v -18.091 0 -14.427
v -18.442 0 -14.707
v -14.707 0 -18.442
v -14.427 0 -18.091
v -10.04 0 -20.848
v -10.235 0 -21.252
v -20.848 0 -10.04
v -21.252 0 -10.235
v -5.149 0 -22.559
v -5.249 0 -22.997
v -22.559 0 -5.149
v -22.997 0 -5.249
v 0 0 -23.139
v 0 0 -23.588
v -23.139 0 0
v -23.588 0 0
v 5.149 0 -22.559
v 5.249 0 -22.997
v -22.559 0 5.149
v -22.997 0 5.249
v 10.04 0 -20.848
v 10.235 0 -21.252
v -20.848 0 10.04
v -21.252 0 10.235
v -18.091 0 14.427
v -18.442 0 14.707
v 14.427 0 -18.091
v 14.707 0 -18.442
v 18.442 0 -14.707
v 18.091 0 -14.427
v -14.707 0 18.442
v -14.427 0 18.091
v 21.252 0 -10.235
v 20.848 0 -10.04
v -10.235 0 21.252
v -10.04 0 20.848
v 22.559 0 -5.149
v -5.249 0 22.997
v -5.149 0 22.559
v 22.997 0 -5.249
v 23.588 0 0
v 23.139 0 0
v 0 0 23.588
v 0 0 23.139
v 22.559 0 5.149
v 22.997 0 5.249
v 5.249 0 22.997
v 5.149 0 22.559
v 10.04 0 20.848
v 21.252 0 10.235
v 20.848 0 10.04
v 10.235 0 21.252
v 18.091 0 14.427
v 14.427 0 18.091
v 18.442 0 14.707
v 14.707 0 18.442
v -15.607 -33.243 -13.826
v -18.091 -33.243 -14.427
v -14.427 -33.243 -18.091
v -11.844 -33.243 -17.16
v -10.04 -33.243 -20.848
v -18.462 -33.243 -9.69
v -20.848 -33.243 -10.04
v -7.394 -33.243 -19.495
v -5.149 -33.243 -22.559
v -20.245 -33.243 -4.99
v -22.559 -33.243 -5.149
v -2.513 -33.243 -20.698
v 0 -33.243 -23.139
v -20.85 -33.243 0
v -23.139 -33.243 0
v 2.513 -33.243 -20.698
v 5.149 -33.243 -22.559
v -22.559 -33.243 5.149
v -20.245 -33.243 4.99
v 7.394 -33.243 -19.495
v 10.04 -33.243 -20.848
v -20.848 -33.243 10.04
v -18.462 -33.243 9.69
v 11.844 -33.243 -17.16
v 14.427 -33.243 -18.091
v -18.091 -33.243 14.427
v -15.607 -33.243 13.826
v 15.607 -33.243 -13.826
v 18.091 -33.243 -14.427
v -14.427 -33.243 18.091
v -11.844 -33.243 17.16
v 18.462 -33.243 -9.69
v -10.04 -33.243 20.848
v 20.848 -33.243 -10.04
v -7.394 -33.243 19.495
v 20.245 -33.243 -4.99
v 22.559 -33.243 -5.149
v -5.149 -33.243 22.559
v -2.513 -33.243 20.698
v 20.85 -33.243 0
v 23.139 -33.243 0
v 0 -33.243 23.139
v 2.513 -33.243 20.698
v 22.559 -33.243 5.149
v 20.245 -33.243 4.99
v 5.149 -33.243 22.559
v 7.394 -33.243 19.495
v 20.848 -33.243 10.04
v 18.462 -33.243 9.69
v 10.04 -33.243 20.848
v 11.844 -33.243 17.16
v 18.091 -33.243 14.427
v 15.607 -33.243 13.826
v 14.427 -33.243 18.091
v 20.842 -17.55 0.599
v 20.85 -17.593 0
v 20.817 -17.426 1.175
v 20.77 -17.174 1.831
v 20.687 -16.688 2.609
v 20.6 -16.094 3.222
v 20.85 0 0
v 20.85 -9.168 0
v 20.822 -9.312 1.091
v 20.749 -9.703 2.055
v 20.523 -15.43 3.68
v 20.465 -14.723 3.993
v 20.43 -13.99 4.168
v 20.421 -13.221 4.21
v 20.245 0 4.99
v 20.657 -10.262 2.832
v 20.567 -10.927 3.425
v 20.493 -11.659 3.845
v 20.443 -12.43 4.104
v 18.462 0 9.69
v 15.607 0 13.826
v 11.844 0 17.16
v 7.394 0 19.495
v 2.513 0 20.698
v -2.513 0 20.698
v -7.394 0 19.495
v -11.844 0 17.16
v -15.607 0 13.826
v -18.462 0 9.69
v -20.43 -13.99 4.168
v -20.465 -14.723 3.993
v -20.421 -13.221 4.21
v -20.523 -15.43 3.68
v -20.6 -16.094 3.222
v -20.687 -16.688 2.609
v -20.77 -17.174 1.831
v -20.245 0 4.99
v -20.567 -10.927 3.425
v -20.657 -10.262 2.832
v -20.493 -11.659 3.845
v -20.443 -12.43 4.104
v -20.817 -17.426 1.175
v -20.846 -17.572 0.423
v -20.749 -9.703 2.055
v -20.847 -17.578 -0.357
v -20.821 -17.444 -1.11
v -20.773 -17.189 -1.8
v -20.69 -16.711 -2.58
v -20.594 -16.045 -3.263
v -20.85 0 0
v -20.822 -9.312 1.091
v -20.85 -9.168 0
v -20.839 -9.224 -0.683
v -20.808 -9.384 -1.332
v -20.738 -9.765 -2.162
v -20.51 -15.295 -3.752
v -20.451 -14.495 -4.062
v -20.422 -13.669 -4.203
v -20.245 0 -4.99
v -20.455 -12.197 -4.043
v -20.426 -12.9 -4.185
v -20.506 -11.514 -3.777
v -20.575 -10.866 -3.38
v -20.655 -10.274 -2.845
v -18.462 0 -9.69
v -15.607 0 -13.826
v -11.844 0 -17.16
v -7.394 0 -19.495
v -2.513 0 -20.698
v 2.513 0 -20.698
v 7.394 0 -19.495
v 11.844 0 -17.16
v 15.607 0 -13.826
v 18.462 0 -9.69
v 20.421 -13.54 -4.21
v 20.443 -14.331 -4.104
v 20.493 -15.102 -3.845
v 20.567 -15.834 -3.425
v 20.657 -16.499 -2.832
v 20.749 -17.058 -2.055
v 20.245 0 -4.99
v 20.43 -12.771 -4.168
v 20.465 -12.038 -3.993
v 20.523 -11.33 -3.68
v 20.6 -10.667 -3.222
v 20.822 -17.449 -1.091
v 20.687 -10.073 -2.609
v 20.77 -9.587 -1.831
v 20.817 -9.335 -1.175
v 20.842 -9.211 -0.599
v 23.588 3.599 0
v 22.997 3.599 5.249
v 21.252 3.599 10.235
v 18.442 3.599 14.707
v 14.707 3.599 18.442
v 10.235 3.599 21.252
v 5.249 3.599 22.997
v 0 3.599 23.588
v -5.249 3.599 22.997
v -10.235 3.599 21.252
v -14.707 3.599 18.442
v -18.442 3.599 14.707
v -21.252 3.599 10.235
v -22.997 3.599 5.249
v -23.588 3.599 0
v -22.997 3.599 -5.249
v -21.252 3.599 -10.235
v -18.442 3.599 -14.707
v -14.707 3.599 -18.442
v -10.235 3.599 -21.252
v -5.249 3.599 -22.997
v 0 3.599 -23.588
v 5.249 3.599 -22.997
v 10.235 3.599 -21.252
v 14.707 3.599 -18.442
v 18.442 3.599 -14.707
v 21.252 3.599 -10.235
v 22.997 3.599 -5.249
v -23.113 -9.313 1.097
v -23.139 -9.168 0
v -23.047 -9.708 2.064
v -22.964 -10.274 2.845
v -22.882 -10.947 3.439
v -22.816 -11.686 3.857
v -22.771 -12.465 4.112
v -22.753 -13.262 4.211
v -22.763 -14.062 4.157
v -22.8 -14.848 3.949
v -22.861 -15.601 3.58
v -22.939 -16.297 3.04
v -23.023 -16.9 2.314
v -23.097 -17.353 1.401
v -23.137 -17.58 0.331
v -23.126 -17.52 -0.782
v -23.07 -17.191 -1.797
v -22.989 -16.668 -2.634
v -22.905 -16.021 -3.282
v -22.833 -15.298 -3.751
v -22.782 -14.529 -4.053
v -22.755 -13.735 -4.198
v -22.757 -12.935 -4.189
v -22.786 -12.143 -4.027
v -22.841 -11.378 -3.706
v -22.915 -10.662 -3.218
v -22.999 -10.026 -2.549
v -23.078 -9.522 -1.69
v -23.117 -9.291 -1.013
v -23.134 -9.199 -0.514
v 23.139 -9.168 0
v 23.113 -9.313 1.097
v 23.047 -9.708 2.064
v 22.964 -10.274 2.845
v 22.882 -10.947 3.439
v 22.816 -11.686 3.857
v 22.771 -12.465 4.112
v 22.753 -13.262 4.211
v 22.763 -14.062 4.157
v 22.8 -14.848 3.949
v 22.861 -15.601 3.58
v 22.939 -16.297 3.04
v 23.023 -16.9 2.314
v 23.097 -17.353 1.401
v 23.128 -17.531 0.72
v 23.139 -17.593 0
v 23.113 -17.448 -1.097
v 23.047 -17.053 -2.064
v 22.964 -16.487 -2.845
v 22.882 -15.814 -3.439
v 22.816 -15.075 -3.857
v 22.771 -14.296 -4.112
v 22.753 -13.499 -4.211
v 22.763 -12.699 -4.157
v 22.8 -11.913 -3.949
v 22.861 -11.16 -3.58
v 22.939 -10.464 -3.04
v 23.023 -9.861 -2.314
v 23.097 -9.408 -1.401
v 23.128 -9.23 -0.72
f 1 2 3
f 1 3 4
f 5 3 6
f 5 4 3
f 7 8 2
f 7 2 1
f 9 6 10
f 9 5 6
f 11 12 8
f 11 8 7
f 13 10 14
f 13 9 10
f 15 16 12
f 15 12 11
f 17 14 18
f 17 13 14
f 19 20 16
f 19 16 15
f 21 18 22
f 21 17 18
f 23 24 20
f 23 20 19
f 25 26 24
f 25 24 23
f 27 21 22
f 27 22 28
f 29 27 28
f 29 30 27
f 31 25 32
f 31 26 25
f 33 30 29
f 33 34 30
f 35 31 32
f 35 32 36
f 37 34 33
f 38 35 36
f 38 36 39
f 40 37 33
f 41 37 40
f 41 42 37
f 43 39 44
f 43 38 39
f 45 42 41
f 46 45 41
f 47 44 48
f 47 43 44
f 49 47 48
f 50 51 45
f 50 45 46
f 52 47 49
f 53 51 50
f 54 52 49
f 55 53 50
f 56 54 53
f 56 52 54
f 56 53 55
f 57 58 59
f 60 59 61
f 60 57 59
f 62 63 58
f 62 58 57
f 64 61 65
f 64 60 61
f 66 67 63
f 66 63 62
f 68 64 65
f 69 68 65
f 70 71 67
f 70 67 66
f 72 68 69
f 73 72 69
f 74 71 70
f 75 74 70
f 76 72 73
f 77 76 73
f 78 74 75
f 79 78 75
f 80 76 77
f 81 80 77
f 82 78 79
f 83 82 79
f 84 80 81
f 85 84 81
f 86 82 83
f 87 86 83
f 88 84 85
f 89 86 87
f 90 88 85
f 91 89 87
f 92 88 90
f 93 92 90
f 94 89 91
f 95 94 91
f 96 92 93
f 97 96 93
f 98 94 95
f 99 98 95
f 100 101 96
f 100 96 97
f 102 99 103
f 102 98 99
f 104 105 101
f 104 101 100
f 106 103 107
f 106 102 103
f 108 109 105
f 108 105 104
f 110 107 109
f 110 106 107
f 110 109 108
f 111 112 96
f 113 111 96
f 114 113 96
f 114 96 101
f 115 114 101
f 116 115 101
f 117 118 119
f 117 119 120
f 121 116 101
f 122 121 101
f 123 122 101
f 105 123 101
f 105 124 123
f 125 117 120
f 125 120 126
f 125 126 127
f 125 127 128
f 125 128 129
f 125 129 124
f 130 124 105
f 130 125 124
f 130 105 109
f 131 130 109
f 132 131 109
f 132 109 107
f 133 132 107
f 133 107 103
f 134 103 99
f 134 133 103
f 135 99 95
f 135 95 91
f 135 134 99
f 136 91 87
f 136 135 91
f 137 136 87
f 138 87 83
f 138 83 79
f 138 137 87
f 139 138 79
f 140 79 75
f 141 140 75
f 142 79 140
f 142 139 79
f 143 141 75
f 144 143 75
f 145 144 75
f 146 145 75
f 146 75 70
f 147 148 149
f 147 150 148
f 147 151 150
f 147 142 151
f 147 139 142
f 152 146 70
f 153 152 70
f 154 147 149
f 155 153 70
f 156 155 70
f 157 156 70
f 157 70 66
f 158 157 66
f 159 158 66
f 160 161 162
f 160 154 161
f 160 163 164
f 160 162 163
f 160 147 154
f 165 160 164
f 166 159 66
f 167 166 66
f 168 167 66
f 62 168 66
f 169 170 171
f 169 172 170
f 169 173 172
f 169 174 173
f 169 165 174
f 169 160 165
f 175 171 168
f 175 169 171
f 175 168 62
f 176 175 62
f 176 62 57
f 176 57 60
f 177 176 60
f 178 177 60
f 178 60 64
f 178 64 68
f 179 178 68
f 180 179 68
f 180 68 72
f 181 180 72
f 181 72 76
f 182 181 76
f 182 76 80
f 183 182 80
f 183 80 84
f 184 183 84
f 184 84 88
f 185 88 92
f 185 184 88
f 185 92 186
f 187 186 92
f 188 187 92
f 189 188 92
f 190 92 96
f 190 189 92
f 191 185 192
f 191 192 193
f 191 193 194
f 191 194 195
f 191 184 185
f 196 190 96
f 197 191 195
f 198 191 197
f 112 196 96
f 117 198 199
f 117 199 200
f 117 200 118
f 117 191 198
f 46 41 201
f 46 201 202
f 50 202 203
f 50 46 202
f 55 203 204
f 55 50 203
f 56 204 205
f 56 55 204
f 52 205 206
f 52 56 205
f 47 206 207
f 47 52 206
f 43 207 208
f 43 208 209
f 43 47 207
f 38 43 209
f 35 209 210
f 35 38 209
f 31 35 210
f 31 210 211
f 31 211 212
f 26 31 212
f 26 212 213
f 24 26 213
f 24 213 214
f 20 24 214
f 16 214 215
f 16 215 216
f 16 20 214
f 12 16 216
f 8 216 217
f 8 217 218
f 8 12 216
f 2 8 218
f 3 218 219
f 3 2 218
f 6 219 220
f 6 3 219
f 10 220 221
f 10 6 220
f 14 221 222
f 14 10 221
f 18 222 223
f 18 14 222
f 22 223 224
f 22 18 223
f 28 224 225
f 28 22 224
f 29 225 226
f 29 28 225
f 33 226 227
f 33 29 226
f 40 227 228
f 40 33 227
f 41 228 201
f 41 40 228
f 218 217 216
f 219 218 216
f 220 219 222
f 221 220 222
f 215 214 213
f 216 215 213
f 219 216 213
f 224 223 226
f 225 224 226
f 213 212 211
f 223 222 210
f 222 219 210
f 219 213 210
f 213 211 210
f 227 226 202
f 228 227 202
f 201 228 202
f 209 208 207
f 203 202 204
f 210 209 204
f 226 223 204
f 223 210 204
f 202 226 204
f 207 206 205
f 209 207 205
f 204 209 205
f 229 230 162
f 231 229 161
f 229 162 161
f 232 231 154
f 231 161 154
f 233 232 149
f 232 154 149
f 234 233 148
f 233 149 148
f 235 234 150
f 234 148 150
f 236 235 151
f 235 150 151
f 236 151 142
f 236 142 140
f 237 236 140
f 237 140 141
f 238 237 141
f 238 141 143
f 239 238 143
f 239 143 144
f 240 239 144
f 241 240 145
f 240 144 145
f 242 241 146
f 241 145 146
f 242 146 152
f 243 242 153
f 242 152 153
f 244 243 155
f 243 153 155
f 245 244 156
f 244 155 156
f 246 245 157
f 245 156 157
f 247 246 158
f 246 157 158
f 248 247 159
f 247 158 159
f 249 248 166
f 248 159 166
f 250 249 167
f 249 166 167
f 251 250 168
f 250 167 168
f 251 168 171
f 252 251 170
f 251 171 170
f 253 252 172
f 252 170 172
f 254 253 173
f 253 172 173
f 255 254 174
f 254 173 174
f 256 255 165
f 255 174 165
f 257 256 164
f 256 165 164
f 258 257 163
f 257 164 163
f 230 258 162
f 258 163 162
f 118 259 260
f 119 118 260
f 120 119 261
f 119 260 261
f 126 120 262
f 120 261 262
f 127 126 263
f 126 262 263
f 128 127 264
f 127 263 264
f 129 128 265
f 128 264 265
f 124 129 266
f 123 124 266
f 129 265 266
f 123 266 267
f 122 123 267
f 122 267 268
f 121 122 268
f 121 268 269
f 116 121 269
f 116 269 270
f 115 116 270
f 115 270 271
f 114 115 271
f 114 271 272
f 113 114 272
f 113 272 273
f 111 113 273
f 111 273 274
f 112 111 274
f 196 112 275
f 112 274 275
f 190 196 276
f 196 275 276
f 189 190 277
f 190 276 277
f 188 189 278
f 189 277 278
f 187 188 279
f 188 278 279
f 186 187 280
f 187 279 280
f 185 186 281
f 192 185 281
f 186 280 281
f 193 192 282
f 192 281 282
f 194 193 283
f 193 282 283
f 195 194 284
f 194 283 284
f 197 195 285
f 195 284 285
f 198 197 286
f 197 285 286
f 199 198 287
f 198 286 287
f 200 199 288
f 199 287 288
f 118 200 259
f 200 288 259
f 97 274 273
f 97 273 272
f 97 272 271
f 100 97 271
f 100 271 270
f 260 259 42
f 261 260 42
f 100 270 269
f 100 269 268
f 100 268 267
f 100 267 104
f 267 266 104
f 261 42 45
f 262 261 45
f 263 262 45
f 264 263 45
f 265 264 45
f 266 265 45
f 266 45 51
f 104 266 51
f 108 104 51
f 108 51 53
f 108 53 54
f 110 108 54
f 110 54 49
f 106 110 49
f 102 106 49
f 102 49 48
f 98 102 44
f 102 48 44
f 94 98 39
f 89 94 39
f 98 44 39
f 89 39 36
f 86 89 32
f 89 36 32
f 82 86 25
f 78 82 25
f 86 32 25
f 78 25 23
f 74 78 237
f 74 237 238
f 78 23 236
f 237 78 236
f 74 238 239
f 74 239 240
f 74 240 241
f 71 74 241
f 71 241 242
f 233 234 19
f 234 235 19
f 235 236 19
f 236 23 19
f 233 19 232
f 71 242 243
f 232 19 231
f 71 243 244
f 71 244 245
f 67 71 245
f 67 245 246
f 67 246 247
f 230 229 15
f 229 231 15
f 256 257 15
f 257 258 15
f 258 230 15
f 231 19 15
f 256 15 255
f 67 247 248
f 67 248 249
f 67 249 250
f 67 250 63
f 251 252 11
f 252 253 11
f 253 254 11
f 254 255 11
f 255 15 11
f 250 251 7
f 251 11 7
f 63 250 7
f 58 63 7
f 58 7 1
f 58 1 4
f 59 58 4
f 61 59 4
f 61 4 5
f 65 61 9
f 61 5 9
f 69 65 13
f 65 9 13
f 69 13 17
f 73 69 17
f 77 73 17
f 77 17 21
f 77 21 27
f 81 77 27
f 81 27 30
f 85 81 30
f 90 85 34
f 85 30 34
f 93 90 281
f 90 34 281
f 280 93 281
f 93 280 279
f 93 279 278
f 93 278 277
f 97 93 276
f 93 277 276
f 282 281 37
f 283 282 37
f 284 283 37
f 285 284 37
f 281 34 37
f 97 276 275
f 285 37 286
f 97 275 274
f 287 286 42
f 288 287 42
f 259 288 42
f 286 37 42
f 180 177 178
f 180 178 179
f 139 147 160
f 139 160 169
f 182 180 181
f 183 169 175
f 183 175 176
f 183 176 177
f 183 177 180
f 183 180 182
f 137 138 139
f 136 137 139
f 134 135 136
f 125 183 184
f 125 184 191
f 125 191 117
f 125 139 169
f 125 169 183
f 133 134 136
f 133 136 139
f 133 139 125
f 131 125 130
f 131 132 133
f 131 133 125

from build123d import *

# Parameters (mm, degrees)
F0_R     = 23.1394
F0_R_2   = 20.850422
F1_DEPTH = 33.243025
F2_R     = 23.588117
F3_DEPTH = 3.598599
F4_R     = 4.212542
F5_DEPTH = 53.346873


with BuildPart() as f1:
    # F0 (on Front) → F1 (new body)
    with BuildSketch(Plane.XZ):
        Circle(F0_R)
        Circle(F0_R_2, mode=Mode.SUBTRACT)
    extrude(amount=F1_DEPTH)

    # F2 (on Front) → F3 (join)
    with BuildSketch(Plane.XZ):
        Circle(F2_R)
    extrude(amount=-F3_DEPTH)

    # F4 (on Right) → F5 (cut, symmetric)
    with BuildSketch(Plane.YZ):
        with Locations((-13.380438, 0)):
            Circle(F4_R)
    extrude(amount=F5_DEPTH, both=True, mode=Mode.SUBTRACT)


solid = f1.part
